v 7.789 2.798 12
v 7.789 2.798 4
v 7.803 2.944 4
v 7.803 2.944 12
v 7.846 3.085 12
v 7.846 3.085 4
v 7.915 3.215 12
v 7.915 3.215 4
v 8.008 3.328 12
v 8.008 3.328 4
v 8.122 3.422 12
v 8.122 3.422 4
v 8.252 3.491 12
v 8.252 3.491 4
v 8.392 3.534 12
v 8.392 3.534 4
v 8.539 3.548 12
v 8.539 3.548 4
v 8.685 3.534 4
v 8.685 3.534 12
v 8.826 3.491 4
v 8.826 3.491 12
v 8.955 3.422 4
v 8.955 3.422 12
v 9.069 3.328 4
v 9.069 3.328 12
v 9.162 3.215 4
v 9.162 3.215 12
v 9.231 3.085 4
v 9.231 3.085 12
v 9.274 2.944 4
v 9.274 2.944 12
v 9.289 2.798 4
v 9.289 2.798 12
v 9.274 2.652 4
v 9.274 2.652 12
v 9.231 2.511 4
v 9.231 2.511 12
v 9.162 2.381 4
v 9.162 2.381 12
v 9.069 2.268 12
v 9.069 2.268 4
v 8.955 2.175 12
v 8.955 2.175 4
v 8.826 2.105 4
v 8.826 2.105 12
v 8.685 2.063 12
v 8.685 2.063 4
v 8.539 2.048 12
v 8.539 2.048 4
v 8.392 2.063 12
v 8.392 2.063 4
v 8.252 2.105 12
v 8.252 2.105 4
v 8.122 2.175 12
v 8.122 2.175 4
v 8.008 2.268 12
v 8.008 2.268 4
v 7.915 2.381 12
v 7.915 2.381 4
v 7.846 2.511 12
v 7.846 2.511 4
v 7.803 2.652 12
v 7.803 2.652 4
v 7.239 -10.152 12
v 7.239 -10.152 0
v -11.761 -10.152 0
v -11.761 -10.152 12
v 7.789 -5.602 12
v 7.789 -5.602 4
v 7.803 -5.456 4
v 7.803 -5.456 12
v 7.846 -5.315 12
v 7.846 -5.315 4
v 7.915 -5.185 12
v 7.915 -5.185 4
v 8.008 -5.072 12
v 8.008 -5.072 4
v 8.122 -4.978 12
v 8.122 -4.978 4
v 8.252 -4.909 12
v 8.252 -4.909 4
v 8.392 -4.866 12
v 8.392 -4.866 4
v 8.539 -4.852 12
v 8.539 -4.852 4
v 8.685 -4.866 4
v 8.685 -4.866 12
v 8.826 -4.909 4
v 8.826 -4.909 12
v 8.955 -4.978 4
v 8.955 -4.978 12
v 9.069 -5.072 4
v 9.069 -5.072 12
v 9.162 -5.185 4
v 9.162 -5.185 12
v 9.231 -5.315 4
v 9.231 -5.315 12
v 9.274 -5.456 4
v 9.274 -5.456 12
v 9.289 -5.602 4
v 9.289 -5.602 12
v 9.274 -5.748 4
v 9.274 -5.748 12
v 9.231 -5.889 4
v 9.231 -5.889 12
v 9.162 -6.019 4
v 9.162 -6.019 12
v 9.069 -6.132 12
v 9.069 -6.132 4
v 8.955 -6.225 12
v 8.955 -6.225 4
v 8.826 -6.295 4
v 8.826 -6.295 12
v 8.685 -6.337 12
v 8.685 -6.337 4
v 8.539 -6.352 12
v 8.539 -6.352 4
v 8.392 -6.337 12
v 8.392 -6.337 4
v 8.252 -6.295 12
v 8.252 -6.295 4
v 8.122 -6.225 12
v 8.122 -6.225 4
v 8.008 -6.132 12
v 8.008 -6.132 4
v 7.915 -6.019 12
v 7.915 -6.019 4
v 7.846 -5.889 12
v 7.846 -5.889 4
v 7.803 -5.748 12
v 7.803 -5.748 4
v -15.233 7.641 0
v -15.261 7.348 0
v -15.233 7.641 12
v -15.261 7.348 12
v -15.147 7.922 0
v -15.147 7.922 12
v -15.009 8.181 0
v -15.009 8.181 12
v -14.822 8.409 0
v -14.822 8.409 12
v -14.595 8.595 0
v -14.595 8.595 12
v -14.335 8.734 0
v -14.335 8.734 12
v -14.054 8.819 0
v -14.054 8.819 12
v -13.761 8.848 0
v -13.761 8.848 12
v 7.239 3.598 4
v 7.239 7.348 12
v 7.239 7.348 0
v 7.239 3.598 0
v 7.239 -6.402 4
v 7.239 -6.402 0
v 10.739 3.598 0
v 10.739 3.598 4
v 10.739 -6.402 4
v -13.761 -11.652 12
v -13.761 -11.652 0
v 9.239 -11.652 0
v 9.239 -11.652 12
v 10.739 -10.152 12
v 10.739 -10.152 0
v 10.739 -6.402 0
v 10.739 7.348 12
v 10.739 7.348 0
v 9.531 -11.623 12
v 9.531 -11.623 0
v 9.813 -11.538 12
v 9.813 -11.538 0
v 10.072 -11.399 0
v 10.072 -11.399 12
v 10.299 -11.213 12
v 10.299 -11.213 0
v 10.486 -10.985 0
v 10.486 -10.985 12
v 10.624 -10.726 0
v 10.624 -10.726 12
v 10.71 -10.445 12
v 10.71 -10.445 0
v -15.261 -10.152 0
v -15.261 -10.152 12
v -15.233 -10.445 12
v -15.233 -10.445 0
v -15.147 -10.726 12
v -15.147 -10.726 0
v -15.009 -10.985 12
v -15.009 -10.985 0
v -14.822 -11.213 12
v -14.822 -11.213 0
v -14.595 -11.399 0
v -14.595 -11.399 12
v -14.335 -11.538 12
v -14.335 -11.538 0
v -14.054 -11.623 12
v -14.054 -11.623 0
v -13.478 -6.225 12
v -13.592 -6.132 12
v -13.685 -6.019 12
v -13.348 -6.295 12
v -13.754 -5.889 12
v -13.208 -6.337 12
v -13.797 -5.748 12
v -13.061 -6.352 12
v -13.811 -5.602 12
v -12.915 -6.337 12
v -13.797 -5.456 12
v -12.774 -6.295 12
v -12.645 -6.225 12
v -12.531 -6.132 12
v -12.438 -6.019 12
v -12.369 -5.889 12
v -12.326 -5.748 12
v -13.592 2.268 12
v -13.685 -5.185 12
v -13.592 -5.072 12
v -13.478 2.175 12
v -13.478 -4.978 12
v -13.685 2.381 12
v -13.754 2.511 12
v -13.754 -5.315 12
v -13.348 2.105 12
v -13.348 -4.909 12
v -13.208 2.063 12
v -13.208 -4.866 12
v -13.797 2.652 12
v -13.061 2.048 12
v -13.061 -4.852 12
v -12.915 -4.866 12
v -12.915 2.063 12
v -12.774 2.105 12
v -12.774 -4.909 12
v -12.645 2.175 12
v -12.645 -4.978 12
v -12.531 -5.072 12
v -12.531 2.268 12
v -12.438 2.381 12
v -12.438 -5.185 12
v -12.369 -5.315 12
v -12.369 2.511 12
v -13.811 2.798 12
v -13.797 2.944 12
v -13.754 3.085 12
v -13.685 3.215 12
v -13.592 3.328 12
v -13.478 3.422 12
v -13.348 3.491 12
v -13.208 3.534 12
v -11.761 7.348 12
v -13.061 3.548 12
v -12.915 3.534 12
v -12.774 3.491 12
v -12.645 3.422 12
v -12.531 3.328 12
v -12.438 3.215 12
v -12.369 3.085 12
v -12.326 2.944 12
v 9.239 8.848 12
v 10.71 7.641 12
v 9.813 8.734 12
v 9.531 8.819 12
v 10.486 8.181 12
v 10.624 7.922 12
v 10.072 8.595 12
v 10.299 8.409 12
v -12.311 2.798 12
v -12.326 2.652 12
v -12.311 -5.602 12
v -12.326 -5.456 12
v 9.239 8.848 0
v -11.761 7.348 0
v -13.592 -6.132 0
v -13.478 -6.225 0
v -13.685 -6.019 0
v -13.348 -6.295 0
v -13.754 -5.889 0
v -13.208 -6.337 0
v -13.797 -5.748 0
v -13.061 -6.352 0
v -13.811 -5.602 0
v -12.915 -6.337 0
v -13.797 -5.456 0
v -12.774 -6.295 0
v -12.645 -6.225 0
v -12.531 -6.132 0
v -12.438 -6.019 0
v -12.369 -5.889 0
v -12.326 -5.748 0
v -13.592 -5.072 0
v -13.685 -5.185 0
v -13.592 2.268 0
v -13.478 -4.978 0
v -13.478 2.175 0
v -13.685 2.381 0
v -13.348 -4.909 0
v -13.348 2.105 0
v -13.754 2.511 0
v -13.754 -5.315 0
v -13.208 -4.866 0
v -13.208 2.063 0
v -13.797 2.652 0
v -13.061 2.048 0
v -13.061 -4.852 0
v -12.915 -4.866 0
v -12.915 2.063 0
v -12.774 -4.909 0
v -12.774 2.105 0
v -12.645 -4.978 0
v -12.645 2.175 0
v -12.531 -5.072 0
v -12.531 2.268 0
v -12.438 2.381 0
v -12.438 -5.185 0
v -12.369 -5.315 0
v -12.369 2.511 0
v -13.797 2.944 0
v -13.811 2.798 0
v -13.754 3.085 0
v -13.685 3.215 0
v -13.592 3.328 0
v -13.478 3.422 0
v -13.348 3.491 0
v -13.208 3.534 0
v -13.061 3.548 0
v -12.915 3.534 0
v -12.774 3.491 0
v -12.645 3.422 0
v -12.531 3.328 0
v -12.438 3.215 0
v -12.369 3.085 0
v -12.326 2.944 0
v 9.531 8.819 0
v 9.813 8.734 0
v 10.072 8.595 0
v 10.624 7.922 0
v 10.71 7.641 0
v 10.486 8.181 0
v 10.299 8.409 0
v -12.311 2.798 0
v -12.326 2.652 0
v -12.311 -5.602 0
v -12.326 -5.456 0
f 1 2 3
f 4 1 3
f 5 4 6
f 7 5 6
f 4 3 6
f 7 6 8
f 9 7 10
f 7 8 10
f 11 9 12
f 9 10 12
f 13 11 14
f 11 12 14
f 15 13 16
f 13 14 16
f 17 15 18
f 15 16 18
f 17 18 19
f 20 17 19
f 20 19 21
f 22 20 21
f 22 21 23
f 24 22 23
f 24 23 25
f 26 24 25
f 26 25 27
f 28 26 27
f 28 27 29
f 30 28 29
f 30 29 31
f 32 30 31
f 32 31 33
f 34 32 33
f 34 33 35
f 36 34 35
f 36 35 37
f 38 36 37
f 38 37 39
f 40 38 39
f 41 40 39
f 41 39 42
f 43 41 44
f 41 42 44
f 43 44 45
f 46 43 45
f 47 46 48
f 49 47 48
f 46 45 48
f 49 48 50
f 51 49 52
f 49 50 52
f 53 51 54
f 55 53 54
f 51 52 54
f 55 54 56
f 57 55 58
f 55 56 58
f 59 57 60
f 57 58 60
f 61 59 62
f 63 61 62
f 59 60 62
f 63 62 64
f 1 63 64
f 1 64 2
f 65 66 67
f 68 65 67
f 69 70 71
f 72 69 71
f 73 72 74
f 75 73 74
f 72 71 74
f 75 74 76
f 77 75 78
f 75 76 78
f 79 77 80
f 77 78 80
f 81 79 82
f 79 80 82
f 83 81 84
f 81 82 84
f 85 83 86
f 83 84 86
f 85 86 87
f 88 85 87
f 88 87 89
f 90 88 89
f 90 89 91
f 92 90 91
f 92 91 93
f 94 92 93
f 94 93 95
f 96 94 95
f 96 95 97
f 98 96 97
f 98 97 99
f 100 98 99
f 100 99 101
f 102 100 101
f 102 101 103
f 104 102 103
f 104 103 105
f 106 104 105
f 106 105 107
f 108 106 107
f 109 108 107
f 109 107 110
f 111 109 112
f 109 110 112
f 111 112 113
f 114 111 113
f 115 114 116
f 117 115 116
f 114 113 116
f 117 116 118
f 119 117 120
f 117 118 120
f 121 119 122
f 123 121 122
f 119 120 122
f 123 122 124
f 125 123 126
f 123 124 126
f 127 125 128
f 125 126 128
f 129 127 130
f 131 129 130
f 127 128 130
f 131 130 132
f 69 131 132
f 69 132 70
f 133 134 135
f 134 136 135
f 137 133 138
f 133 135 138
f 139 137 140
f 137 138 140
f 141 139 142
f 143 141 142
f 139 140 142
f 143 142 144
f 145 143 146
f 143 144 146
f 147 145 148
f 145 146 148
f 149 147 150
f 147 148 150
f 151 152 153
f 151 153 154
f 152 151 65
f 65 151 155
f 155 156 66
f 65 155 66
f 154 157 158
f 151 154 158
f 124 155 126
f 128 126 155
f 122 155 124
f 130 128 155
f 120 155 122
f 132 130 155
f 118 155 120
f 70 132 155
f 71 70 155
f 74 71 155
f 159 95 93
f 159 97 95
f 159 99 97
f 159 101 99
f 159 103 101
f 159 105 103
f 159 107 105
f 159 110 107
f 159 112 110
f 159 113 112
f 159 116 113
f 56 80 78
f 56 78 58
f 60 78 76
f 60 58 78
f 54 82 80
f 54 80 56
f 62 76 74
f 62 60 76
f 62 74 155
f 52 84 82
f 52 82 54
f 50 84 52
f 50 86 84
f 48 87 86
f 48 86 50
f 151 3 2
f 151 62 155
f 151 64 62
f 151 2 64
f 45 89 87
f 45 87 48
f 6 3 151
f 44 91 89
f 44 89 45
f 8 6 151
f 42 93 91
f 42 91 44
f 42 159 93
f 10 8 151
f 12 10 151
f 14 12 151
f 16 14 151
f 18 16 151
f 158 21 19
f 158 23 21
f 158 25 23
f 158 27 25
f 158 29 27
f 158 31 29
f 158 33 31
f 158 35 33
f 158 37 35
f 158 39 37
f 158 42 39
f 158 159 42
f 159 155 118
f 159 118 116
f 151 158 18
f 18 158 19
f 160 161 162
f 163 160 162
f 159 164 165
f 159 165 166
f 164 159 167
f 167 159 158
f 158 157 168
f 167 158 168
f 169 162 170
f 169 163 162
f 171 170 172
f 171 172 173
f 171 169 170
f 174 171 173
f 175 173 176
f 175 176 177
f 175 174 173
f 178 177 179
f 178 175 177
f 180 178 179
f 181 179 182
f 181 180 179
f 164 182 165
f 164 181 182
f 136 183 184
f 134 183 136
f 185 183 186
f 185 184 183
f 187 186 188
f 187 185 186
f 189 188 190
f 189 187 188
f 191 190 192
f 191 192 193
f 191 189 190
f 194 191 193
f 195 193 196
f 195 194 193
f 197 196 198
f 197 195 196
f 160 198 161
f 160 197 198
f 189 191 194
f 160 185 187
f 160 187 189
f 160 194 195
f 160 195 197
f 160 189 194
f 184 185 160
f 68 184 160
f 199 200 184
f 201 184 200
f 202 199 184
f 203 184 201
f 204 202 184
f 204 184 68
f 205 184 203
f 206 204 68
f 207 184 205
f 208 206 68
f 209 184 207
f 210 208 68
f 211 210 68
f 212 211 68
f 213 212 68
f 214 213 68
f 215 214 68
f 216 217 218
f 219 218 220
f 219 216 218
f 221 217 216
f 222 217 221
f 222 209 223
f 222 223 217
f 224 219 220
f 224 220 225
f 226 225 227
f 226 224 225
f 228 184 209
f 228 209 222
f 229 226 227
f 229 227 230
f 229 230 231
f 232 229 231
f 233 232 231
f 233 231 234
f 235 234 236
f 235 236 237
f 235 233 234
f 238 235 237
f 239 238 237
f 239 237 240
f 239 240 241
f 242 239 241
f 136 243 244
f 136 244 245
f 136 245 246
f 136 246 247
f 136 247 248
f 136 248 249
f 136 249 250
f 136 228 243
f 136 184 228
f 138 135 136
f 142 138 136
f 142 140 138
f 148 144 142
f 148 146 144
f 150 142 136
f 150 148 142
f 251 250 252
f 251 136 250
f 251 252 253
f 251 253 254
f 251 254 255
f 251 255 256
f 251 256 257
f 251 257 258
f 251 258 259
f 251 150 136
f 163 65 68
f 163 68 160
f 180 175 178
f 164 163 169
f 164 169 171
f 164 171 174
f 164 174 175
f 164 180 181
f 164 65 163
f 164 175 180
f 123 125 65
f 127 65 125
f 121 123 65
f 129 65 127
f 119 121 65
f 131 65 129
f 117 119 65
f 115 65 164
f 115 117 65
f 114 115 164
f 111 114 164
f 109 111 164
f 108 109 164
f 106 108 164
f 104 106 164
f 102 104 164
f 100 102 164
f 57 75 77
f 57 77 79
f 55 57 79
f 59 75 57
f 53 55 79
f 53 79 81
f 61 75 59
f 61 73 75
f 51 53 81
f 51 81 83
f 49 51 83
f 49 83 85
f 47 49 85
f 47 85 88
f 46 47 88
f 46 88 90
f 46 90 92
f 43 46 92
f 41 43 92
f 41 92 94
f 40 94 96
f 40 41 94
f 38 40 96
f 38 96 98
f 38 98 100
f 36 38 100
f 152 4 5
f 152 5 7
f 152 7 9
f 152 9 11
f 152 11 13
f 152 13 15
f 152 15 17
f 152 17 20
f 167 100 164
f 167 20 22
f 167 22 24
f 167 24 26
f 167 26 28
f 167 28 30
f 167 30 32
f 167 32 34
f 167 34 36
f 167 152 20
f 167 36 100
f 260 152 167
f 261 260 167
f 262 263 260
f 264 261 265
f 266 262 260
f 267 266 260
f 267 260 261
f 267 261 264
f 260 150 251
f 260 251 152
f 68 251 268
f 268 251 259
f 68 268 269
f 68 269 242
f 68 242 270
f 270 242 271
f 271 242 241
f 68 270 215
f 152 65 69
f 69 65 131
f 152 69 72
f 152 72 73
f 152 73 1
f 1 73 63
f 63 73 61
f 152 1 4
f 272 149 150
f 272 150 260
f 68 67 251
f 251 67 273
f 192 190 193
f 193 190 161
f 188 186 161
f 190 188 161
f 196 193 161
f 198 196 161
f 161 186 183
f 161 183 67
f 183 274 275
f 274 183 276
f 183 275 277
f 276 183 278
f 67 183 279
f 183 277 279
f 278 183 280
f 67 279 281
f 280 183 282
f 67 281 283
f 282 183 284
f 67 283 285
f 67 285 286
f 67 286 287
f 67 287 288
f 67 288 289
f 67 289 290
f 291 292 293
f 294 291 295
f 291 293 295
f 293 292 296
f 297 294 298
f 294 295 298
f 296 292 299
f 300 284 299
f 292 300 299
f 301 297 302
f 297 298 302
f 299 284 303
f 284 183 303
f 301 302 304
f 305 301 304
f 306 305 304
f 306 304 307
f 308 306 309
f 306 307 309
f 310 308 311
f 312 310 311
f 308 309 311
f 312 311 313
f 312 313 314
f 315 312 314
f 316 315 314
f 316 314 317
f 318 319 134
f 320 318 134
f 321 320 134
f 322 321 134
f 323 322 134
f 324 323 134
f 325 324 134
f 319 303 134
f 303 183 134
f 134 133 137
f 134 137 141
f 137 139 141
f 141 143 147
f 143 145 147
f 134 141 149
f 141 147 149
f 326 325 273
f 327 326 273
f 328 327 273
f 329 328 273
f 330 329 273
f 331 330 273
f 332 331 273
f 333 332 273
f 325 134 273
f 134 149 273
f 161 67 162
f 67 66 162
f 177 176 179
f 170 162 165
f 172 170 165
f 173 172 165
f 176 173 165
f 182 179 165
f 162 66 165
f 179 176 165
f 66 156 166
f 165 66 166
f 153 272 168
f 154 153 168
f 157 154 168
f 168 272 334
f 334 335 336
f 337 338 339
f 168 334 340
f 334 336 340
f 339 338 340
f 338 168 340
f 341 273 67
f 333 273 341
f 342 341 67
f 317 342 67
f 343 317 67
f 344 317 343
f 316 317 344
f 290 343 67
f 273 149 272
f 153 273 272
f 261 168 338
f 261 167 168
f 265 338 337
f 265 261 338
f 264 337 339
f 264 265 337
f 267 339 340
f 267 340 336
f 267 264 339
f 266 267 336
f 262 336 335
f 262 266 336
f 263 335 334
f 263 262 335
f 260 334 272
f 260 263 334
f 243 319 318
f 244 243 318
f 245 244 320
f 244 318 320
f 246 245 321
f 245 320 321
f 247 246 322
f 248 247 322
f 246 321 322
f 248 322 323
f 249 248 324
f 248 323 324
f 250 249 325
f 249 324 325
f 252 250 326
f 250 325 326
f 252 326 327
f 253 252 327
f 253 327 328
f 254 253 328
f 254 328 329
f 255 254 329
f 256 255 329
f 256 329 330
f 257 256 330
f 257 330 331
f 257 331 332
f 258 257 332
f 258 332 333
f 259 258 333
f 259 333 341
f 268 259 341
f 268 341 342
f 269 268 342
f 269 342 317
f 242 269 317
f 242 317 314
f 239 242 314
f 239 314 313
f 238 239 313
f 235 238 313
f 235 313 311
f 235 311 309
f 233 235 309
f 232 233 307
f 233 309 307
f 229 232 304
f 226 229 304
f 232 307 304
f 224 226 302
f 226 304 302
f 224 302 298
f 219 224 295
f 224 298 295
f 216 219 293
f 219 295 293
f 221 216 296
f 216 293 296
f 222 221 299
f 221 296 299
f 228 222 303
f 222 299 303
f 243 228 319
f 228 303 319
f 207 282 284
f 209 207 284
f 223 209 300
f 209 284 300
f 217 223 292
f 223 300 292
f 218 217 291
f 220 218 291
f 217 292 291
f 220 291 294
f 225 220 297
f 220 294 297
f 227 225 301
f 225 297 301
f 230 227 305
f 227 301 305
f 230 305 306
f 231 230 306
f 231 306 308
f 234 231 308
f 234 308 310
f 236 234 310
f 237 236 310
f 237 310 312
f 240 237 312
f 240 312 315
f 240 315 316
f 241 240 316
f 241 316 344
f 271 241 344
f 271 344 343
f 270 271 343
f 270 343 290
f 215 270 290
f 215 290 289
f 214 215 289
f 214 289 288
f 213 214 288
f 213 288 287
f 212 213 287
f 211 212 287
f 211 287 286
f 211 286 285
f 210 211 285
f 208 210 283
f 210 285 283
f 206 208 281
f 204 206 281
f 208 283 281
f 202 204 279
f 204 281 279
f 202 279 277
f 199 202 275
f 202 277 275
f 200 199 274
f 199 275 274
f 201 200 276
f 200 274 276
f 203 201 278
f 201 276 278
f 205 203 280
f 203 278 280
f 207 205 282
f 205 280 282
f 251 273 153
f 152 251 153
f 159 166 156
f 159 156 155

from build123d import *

# Parameters (mm, degrees)
F0_W     = 26
F0_H     = 20.5
F1_DEPTH = 12
F3_R     = 1.5
F5_D     = 1.5
F6_D     = 1.5
F7_D     = 1.5
F8_D     = 1.5
F2_W     = 10
F2_H     = 4
F9_DEPTH = 10


with BuildPart() as f1:
    # F0 (on Top) → F1 (new body)
    with BuildSketch(Plane.XY):
        with Locations((-2.261453, -1.401873)):
            Rectangle(F0_W, F0_H)
        Polygon((-11.761453, -10.151873), (-11.761453, 7.348127), (5.738547, 7.348127), (7.238547, 7.348127), (7.238547, -10.151873), (5.738547, -10.151873), align=None, mode=Mode.SUBTRACT)
    extrude(amount=F1_DEPTH)

    # F3
    f3_edges = [f1.edges().sort_by_distance(p)[0] for p in [
        (10.738547, 8.848127, 6),
        (10.738547, -11.651873, 6),
        (-15.261453, -11.651873, 6),
        (-15.261453, 8.848127, 6),
    ]]
    fillet(f3_edges, radius=F3_R)

    # F5 (through all)
    with Locations(Plane.XY.offset(12)):
        with Locations((-13.061453, 2.798127)):
            Hole(F5_D / 2)

    # F6 (through all)
    with Locations(Plane.XY.offset(12)):
        with Locations((-13.061453, -5.601873)):
            Hole(F6_D / 2)

    # F7 (through all)
    with Locations(Plane.XY.offset(12)):
        with Locations((8.538547, -5.601873)):
            Hole(F7_D / 2)

    # F8 (through all)
    with Locations(Plane.XY.offset(12)):
        with Locations((8.538547, 2.798127)):
            Hole(F8_D / 2)

    # F2 (on face) → F9 (cut)
    with BuildSketch(Plane.YZ.offset(10.738547)):
        with Locations((-1.401873, 2)):
            Rectangle(F2_W, F2_H)
    extrude(amount=-F9_DEPTH, mode=Mode.SUBTRACT)


solid = f1.part
